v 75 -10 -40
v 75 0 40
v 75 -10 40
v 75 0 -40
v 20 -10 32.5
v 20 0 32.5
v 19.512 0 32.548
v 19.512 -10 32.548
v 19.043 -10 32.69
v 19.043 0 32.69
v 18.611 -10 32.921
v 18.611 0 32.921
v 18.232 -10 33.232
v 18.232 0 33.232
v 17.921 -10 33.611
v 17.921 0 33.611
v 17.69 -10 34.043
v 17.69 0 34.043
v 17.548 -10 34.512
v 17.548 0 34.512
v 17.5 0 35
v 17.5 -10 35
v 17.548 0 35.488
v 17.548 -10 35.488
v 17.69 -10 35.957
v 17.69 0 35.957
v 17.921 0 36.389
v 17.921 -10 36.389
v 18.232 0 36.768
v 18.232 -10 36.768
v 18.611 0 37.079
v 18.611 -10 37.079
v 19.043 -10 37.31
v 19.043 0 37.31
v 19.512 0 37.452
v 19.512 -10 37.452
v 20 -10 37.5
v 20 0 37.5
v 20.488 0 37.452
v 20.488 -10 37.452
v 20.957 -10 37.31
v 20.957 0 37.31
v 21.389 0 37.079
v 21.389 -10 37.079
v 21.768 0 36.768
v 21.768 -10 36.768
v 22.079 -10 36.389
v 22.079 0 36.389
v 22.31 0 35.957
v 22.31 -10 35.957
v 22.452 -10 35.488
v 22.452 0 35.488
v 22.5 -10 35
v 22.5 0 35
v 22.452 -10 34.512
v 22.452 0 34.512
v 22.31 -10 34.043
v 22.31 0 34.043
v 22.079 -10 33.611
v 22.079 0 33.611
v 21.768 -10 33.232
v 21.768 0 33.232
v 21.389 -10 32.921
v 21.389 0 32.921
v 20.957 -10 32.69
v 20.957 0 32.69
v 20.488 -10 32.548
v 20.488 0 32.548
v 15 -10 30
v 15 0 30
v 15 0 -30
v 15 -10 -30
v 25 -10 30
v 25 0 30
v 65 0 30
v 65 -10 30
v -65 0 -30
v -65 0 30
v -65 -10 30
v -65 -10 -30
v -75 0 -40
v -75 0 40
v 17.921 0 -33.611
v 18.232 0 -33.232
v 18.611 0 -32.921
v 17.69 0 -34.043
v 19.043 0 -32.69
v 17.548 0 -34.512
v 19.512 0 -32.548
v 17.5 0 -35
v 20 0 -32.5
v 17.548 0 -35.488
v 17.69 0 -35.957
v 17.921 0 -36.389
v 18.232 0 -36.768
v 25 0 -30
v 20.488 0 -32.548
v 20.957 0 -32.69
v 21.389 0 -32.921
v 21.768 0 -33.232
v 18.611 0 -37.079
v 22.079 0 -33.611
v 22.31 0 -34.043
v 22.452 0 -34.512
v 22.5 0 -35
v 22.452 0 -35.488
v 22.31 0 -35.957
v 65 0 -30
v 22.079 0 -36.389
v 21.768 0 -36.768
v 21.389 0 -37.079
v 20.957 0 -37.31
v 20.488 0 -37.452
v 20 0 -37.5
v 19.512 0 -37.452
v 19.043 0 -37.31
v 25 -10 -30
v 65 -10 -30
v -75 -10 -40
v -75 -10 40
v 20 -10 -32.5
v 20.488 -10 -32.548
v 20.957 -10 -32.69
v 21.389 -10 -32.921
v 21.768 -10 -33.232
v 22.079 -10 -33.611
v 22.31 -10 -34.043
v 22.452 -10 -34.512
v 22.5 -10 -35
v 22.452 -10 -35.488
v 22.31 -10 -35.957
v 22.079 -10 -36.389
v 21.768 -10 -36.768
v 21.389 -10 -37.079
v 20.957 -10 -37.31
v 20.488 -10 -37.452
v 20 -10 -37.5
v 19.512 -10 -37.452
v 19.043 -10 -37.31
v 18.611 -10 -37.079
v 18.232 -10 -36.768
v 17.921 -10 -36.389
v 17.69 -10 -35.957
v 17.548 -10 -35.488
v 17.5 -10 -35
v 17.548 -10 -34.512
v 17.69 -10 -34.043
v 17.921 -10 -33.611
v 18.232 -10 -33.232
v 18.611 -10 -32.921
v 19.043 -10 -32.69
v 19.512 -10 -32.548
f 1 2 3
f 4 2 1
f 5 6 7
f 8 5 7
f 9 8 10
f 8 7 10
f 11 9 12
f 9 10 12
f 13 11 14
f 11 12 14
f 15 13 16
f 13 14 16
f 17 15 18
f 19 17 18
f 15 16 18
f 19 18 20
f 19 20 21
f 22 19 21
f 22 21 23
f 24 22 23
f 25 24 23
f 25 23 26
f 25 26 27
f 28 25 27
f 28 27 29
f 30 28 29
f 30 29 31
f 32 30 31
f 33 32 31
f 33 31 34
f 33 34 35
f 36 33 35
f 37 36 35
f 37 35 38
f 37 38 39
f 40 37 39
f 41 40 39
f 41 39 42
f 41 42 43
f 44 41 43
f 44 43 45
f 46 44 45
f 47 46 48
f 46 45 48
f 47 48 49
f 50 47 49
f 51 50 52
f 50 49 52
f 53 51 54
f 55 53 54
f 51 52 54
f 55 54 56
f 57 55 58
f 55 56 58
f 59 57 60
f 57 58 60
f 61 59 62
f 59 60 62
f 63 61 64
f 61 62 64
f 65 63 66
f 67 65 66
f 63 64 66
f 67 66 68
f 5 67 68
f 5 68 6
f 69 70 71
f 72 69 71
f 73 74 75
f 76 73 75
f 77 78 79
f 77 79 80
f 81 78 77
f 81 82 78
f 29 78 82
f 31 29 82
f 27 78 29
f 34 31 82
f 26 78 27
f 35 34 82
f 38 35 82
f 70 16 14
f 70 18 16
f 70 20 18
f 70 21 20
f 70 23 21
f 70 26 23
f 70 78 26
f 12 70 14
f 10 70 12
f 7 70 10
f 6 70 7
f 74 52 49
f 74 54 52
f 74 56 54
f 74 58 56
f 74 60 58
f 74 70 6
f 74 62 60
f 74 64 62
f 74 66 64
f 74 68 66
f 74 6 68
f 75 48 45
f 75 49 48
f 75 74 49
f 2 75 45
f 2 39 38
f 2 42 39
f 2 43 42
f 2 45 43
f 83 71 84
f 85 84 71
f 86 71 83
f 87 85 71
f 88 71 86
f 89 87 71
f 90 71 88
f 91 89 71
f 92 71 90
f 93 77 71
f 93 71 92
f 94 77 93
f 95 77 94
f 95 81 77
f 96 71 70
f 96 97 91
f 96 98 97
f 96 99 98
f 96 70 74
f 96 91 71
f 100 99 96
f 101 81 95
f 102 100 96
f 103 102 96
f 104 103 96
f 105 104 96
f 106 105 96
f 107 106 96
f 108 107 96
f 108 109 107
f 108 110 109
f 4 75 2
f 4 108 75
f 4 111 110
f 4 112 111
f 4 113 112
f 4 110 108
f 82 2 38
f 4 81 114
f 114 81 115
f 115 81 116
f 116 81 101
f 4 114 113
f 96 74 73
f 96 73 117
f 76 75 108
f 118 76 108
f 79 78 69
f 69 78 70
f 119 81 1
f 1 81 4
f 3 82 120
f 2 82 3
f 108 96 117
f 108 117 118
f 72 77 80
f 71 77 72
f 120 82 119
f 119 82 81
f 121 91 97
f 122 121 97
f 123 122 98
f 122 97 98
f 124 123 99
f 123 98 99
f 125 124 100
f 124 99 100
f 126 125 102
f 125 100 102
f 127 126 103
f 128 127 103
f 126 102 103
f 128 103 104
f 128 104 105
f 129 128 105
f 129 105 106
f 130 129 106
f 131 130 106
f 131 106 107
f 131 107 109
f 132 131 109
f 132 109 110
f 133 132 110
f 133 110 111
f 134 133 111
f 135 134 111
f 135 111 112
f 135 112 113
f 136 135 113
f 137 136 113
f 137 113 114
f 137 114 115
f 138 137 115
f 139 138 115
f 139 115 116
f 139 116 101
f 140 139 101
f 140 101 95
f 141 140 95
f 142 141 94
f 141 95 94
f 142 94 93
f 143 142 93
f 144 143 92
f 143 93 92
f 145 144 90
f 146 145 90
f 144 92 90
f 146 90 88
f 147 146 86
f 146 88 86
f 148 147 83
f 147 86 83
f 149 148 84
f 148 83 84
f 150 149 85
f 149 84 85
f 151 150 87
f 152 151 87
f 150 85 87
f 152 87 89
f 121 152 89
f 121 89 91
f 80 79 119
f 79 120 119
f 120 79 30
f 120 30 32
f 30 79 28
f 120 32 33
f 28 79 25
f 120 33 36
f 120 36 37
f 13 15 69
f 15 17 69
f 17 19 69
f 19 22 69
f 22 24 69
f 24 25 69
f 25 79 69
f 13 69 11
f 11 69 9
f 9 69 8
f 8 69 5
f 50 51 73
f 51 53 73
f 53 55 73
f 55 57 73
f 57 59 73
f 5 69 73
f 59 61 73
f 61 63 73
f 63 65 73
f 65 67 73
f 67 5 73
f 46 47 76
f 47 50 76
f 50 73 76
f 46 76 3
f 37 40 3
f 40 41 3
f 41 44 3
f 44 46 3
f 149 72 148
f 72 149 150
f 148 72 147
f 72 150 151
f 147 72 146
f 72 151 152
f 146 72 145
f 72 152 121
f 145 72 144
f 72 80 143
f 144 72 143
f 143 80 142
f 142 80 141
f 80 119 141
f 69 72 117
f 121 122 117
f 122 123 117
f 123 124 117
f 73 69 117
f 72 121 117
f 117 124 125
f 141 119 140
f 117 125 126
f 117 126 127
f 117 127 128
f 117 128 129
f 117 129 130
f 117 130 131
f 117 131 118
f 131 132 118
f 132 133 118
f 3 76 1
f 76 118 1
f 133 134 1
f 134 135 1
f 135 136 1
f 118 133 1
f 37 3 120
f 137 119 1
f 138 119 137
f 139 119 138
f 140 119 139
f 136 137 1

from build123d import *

# Parameters (mm, degrees)
SKETCH1_W           = 150
SKETCH1_H           = 80
BOSS_EXTRUDE1_DEPTH = 10
SKETCH2_W           = 80
SKETCH2_H           = 60
SKETCH2_W_2         = 40
CUT_EXTRUDE1_DEPTH  = 10
SKETCH3_R           = 2.5
CUT_EXTRUDE2_DEPTH  = 86.586213843


with BuildPart() as part:
    # Sketch1 → Boss-Extrude1 (new body)
    with BuildSketch(Plane(origin=(0, 0, 0), x_dir=(1, 0, 0), z_dir=(0, 1, 0))):
        Rectangle(SKETCH1_W, SKETCH1_H)
    extrude(amount=-BOSS_EXTRUDE1_DEPTH)

    # Sketch2 → Cut-Extrude1 (cut)
    with BuildSketch(Plane(origin=(0, 0, 0), x_dir=(1, 0, 0), z_dir=(0, 1, 0))):
        with Locations((-25, 0)):
            Rectangle(SKETCH2_W, SKETCH2_H)
        with Locations((45, 0)):
            Rectangle(SKETCH2_W_2, SKETCH2_H)
    extrude(amount=-CUT_EXTRUDE1_DEPTH, mode=Mode.SUBTRACT)

    # Sketch3 → Cut-Extrude2 (cut, through all)
    with BuildSketch(Plane(origin=(0, 0, 0), x_dir=(1, 0, 0), z_dir=(0, 1, 0))):
        with Locations(Location((20, 35, 0), (0, 0, 270))):
            Circle(SKETCH3_R)
        with Locations(Location((20, -35, 0), (0, 0, 90))):
            Circle(SKETCH3_R)
    extrude(amount=-CUT_EXTRUDE2_DEPTH, mode=Mode.SUBTRACT)


solid = part.part
